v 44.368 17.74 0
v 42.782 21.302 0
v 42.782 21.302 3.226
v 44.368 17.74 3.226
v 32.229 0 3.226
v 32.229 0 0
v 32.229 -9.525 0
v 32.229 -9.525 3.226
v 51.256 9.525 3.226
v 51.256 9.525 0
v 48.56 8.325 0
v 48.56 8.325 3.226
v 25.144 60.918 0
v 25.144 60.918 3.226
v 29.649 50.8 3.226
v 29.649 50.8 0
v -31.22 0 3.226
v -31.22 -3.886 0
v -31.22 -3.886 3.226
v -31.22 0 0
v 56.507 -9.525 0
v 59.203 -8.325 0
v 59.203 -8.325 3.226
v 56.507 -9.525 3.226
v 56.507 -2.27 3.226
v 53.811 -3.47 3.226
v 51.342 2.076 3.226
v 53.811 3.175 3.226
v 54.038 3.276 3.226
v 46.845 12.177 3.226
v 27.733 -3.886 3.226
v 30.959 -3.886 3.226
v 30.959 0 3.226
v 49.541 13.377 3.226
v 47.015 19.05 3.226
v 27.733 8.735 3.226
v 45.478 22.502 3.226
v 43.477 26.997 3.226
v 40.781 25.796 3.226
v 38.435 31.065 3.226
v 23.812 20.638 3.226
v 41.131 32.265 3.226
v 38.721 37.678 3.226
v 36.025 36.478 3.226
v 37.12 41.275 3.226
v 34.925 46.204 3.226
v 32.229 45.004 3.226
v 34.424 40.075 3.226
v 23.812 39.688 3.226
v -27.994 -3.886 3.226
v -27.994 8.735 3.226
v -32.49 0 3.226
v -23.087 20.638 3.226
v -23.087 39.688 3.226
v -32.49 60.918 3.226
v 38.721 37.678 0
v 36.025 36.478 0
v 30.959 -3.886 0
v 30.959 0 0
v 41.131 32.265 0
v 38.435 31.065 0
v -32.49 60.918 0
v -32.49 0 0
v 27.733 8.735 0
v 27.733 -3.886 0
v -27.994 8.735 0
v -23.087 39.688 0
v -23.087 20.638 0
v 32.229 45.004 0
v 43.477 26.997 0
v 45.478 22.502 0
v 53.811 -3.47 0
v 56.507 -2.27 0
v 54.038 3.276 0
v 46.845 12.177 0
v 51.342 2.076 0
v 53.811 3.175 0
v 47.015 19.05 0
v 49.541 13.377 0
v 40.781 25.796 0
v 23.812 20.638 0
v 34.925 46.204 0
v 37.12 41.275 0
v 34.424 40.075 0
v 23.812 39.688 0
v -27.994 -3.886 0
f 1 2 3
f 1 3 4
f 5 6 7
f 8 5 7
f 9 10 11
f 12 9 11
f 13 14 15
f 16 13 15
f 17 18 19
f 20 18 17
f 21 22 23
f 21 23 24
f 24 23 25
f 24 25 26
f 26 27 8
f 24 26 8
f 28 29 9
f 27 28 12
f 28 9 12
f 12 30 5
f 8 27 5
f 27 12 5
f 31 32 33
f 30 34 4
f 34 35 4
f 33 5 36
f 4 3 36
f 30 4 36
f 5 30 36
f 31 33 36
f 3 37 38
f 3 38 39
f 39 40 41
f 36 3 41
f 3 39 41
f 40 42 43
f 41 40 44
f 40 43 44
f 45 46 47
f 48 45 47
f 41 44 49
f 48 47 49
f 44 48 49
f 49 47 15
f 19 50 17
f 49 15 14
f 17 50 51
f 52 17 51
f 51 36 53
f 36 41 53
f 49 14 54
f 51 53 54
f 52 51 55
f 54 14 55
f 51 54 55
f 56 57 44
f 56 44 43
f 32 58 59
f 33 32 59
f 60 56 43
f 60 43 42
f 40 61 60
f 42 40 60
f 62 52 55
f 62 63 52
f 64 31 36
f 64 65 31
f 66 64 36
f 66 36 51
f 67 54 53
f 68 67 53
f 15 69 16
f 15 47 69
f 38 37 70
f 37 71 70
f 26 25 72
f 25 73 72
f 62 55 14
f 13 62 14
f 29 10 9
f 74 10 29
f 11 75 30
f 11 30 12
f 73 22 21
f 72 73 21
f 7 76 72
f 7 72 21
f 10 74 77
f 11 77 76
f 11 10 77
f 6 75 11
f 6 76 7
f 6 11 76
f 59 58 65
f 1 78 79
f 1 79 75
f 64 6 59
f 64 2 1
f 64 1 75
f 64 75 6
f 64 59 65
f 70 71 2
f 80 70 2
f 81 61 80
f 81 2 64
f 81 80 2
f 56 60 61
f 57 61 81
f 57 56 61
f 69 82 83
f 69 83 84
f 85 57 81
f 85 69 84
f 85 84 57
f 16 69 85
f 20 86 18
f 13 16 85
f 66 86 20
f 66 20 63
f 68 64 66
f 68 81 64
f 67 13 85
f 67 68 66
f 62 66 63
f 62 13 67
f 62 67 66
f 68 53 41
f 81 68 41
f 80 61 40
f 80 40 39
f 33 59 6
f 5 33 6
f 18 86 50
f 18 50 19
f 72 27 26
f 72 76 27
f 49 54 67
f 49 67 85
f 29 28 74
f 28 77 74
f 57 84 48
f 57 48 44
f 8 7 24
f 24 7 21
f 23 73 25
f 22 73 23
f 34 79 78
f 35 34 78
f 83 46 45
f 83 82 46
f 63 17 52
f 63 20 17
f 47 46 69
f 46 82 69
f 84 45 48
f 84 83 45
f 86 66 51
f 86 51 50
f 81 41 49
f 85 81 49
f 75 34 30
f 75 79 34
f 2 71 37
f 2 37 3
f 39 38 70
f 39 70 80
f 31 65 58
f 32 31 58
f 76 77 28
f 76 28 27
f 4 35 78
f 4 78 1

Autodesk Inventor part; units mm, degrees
ref_plane "YZ Plane" through (0, 0, 0) normal (1, 0, 0) x (0, 1, 0)
ref_plane "XZ Plane" through (0, 0, 0) normal (0, 1, 0) x (-1, 0, 0)
ref_plane "XY Plane" through (0, 0, 0) normal (0, 0, 1) x (1, 0, 0)
sketch "Sketch1" plane through (0, 0, 0) normal (0, 0, 1) x (1, 0, 0)
  line L0 (-27.9942, -0.0006) -> (-27.9942, -3.8862)
  line L1 (-27.9942, -3.8862) -> (-31.22, -3.8862)
  line L2 (27.7334, 0) -> (27.7334, -3.8862)
  line L3 (-31.22, -3.8862) -> (-31.22, 45.0041)
  line L4 (27.7334, -3.8862) -> (30.9592, -3.8862)
  line L5 (30.9592, -3.8862) -> (30.9592, 45.0041)
  line L6 (30.9592, 45.0041) -> (-31.22, 45.0041)
  line L7 (27.7334, -3.8862) -> (27.7334, 0)
  line L8 (27.7334, 0) -> (27.7334, 6.9041)
  line L9 (27.7334, 6.9041) -> (-27.9942, 6.9041)
  line L10 (-27.9942, 6.9041) -> (-27.9942, -0.0006)
  line L11 (30.9592, 6.9041) -> (-31.22, 6.9041)
  point P0 (0, 0)
  point P1 (27.7334, 4.1367)
  dimension "d3" = 3.2258
  dimension "d4" = 55.7276
  dimension "d5" = 3.2258
  dimension "d33" = 38.1
extrude "Extrusion1" add sketch "Sketch1" along normal blind 3.2258
sketch "Sketch2" plane through (30.9592, -3.8862, 0) normal (1, 0, 0) x (0, 0, -1)
  point P0 (0, 3.8862)
sketch "Sketch4" plane through (0, 0, 0) normal (0, 0, -1) x (-1, 0, 0)
  point P0 (0, 0)
sketch "Sketch5" plane through (0, 0, 0) normal (0, 0, -1) x (-1, 0, 0)
  line L0 (-30.9592, -3.8862) -> (-30.9592, 45.0041) projected
  line L1 (-30.9592, 0) -> (-30.9592, -1.27)
  line L2 (-30.9592, 0) -> (-32.2292, 0)
  line L3 (-32.2292, 0) -> (-32.2292, 45.0041)
  line L4 (-32.2292, 45.0041) -> (-30.9592, 45.0041)
  line L5 (-30.9592, 45.0041) -> (31.22, 45.0041) projected
  line L6 (0.1304, 45.0041) -> (0.1304, 20.6375)
  line L7 (31.22, 0) -> (32.49, 0)
  line L8 (32.49, 0) -> (32.49, 45.0041)
  line L9 (32.49, 45.0041) -> (31.22, 45.0041)
  line L10 (31.22, 45.0041) -> (31.22, -3.8862) projected
  point P0 (0, 0)
  point P1 (-21.0964, 42.2367)
  point P2 (21.0964, 42.2367)
  point P3 (31.22, 0)
  dimension "d14" = 1.27
  dimension "d15" = 1.27
extrude "Extrusion3" add sketch "Sketch5" against normal blind 3.2258
sketch "Sketch10" plane through (0, 0, 0) normal (0, 0, -1) x (-1, 0, 0)
  point P0 (0, 0)
sketch "Sketch11" plane through (0, 0, 0) normal (0, 0, -1) x (-1, 0, 0)
  point P0 (0, 0)
sketch "Sketch13" plane through (0, 0, 0) normal (0, 0, -1) x (-1, 0, 0)
  line L0 (-32.2292, 45.0041) -> (-32.2292, 0) projected
  line L1 (-32.2292, 45.0041) -> (27.4604, 45.0041) construction
  line L2 (-56.5071, -9.525) -> (-32.8958, -9.525)
  line L3 (-32.2292, 0) -> (-30.9592, 0) projected
  line L4 (-32.2292, 0) -> (-32.2292, -9.525)
  line L5 (-32.2292, -9.525) -> (-32.8958, -9.525)
  line L6 (-34.925, 46.2044) -> (-32.2292, 45.0041)
  line L7 (-59.2029, -8.3247) -> (-56.5071, -9.525)
  line L8 (-56.5071, -2.2699) -> (-53.8113, -3.4701)
  line L9 (-53.8113, 3.175) -> (-51.3422, 2.0757)
  line L10 (-37.1197, 41.275) -> (-34.4239, 40.0747)
  line L11 (-36.0254, 36.4778) -> (-38.7212, 37.678)
  line L12 (-38.4353, 31.0649) -> (-41.1312, 32.2651)
  line L13 (-34.925, 46.2044) -> (-37.1197, 41.275)
  line L14 (-38.7212, 37.678) -> (-41.1312, 32.2651)
  line L15 (-56.5071, -2.2699) -> (-59.2029, -8.3247)
  line L16 (-51.2557, 9.525) -> (-48.5599, 8.3247)
  line L17 (-59.2029, -8.3247) -> (-56.5071, -2.2699)
  line L18 (-53.8113, 3.175) -> (-54.038, 3.2759)
  line L19 (-56.5071, -2.2699) -> (-59.2029, -8.3247)
  line L20 (-49.5406, 13.3771) -> (-46.8448, 12.1769)
  line L21 (-47.0149, 19.05) -> (-44.3682, 17.7396)
  line L22 (-45.478, 22.5021) -> (-42.7821, 21.3018)
  line L23 (-43.4768, 26.9966) -> (-40.781, 25.7964)
  line L24 (-34.925, 46.2044) -> (-37.1197, 41.275)
  line L25 (-38.7212, 37.678) -> (-41.1312, 32.2651)
  line L26 (-49.5406, 13.3771) -> (-47.0149, 19.05)
  line L27 (-45.478, 22.5021) -> (-43.4768, 26.9966)
  line L28 (-47.0149, 19.05) -> (-49.5406, 13.3771)
  line L29 (-51.2557, 9.525) -> (-54.038, 3.2759)
  line L30 (-51.3422, 2.0757) -> (-53.8113, -3.4701)
  line L31 (-46.8448, 12.1769) -> (-48.5599, 8.3247)
  line L32 (-42.7821, 21.3018) -> (-44.3682, 17.7396)
  line L33 (-34.4239, 40.0747) -> (-36.0254, 36.4778)
  line L34 (-38.4353, 31.0649) -> (-40.781, 25.7964)
  point P0 (0, 0)
extrude "Extrusion8" add sketch "Sketch13" against normal blind 3.2258
sketch "Sketch14" plane through (0, 0, 3.2258) normal (0, 0, 1) x (1, 0, 0)
  line L0 (-32.49, 45.0041) -> (32.2292, 45.0041) projected
  line L1 (-23.0867, 39.6875) -> (-23.0867, 31.75)
  line L2 (23.8125, 31.75) -> (23.8125, 39.6875)
  line L3 (-23.0867, 31.75) -> (-23.0867, 28.575)
  line L4 (23.8125, 28.575) -> (23.8125, 31.75)
  line L5 (-23.0867, 39.6875) -> (23.8125, 39.6875)
  line L6 (-23.0867, 28.575) -> (-23.0867, 20.6375)
  line L7 (-23.0867, 20.6375) -> (23.8125, 20.6375)
  line L8 (23.8125, 20.6375) -> (23.8125, 28.575)
  point P0 (0, 0)
  point P1 (-27.9942, 45.0041)
  point P2 (27.7334, 45.0041)
extrude "Extrusion9" cut sketch "Sketch14" against normal through all
sketch "Sketch15" plane through (0, 0, 0) normal (0, 0, -1) x (-1, 0, 0)
  line L0 (27.9942, 6.9041) -> (-27.7334, 6.9041) projected
  line L1 (-27.7334, 6.9041) -> (-27.7334, 8.7347)
  line L2 (-27.7334, 8.7347) -> (27.9942, 8.7347)
  line L3 (27.9942, 8.7347) -> (27.9942, 6.9041)
  point P0 (0, 0)
extrude "Extrusion10" cut sketch "Sketch15" against normal through all
sketch "Sketch16" plane through (0, 0, 3.2258) normal (0, 0, 1) x (1, 0, 0)
  line L0 (37.1197, 41.275) -> (34.4239, 40.0747) projected
  line L1 (34.4239, 40.0747) -> (29.6487, 50.8)
  line L2 (34.4239, 40.0747) -> (46.1641, 40.0747) construction
  line L3 (-32.49, 45.0041) -> (-32.49, 0) projected
  line L4 (-32.49, 45.0041) -> (-32.49, 60.9185)
  line L5 (-32.49, 60.9185) -> (25.1436, 60.9185)
  line L6 (25.1436, 60.9185) -> (29.6487, 50.8)
  line L7 (-32.49, 45.0041) -> (32.2292, 45.0041) projected
  line L8 (-32.49, 45.0041) -> (32.2292, 45.0041)
  line L9 (-31.22, 48.8903) -> (-31.22, 45.0041) projected
  line L10 (-31.22, 45.0041) -> (-31.22, 48.8903)
  line L11 (-31.22, 48.8903) -> (-28.575, 48.8903)
  line L12 (-31.22, 48.8903) -> (-27.9942, 48.8903) projected
  line L13 (-27.9942, 48.8903) -> (-27.9942, 45.0041) projected
  line L14 (-27.9942, 48.8903) -> (-27.9942, 45.0041)
  line L15 (-32.49, 45.0041) -> (32.2292, 45.0041) projected
  line L16 (27.7334, 45.0041) -> (27.7334, 48.8903) projected
  line L17 (27.7334, 45.0041) -> (27.7334, 48.8903)
  line L18 (27.7334, 48.8903) -> (30.9592, 48.8903) projected
  line L19 (27.7334, 48.8903) -> (30.9592, 48.8903)
  line L20 (-29.187, 48.8903) -> (-27.9942, 48.8903)
  line L21 (32.2292, 45.0041) -> (34.925, 46.2044) projected
  line L22 (-32.49, 45.0041) -> (32.2292, 45.0041)
  line L23 (25.1436, 60.9185) -> (32.2292, 45.0041)
  point P0 (0, 0)
  point P1 (30.9592, 45.0041)
  dimension "d47" = 114
sketch "Sketch17" plane through (0, 0, 3.2258) normal (0, 0, 1) x (1, 0, 0)
  line L0 (-32.49, 45.0041) -> (32.2292, 45.0041) projected
  line L1 (-32.49, 45.0041) -> (32.2292, 45.0041)
  point P0 (0, 0)
extrude "Extrusion11" add sketch "Sketch16" against normal blind 3.2258
properties part number "mcdave_rail2"
